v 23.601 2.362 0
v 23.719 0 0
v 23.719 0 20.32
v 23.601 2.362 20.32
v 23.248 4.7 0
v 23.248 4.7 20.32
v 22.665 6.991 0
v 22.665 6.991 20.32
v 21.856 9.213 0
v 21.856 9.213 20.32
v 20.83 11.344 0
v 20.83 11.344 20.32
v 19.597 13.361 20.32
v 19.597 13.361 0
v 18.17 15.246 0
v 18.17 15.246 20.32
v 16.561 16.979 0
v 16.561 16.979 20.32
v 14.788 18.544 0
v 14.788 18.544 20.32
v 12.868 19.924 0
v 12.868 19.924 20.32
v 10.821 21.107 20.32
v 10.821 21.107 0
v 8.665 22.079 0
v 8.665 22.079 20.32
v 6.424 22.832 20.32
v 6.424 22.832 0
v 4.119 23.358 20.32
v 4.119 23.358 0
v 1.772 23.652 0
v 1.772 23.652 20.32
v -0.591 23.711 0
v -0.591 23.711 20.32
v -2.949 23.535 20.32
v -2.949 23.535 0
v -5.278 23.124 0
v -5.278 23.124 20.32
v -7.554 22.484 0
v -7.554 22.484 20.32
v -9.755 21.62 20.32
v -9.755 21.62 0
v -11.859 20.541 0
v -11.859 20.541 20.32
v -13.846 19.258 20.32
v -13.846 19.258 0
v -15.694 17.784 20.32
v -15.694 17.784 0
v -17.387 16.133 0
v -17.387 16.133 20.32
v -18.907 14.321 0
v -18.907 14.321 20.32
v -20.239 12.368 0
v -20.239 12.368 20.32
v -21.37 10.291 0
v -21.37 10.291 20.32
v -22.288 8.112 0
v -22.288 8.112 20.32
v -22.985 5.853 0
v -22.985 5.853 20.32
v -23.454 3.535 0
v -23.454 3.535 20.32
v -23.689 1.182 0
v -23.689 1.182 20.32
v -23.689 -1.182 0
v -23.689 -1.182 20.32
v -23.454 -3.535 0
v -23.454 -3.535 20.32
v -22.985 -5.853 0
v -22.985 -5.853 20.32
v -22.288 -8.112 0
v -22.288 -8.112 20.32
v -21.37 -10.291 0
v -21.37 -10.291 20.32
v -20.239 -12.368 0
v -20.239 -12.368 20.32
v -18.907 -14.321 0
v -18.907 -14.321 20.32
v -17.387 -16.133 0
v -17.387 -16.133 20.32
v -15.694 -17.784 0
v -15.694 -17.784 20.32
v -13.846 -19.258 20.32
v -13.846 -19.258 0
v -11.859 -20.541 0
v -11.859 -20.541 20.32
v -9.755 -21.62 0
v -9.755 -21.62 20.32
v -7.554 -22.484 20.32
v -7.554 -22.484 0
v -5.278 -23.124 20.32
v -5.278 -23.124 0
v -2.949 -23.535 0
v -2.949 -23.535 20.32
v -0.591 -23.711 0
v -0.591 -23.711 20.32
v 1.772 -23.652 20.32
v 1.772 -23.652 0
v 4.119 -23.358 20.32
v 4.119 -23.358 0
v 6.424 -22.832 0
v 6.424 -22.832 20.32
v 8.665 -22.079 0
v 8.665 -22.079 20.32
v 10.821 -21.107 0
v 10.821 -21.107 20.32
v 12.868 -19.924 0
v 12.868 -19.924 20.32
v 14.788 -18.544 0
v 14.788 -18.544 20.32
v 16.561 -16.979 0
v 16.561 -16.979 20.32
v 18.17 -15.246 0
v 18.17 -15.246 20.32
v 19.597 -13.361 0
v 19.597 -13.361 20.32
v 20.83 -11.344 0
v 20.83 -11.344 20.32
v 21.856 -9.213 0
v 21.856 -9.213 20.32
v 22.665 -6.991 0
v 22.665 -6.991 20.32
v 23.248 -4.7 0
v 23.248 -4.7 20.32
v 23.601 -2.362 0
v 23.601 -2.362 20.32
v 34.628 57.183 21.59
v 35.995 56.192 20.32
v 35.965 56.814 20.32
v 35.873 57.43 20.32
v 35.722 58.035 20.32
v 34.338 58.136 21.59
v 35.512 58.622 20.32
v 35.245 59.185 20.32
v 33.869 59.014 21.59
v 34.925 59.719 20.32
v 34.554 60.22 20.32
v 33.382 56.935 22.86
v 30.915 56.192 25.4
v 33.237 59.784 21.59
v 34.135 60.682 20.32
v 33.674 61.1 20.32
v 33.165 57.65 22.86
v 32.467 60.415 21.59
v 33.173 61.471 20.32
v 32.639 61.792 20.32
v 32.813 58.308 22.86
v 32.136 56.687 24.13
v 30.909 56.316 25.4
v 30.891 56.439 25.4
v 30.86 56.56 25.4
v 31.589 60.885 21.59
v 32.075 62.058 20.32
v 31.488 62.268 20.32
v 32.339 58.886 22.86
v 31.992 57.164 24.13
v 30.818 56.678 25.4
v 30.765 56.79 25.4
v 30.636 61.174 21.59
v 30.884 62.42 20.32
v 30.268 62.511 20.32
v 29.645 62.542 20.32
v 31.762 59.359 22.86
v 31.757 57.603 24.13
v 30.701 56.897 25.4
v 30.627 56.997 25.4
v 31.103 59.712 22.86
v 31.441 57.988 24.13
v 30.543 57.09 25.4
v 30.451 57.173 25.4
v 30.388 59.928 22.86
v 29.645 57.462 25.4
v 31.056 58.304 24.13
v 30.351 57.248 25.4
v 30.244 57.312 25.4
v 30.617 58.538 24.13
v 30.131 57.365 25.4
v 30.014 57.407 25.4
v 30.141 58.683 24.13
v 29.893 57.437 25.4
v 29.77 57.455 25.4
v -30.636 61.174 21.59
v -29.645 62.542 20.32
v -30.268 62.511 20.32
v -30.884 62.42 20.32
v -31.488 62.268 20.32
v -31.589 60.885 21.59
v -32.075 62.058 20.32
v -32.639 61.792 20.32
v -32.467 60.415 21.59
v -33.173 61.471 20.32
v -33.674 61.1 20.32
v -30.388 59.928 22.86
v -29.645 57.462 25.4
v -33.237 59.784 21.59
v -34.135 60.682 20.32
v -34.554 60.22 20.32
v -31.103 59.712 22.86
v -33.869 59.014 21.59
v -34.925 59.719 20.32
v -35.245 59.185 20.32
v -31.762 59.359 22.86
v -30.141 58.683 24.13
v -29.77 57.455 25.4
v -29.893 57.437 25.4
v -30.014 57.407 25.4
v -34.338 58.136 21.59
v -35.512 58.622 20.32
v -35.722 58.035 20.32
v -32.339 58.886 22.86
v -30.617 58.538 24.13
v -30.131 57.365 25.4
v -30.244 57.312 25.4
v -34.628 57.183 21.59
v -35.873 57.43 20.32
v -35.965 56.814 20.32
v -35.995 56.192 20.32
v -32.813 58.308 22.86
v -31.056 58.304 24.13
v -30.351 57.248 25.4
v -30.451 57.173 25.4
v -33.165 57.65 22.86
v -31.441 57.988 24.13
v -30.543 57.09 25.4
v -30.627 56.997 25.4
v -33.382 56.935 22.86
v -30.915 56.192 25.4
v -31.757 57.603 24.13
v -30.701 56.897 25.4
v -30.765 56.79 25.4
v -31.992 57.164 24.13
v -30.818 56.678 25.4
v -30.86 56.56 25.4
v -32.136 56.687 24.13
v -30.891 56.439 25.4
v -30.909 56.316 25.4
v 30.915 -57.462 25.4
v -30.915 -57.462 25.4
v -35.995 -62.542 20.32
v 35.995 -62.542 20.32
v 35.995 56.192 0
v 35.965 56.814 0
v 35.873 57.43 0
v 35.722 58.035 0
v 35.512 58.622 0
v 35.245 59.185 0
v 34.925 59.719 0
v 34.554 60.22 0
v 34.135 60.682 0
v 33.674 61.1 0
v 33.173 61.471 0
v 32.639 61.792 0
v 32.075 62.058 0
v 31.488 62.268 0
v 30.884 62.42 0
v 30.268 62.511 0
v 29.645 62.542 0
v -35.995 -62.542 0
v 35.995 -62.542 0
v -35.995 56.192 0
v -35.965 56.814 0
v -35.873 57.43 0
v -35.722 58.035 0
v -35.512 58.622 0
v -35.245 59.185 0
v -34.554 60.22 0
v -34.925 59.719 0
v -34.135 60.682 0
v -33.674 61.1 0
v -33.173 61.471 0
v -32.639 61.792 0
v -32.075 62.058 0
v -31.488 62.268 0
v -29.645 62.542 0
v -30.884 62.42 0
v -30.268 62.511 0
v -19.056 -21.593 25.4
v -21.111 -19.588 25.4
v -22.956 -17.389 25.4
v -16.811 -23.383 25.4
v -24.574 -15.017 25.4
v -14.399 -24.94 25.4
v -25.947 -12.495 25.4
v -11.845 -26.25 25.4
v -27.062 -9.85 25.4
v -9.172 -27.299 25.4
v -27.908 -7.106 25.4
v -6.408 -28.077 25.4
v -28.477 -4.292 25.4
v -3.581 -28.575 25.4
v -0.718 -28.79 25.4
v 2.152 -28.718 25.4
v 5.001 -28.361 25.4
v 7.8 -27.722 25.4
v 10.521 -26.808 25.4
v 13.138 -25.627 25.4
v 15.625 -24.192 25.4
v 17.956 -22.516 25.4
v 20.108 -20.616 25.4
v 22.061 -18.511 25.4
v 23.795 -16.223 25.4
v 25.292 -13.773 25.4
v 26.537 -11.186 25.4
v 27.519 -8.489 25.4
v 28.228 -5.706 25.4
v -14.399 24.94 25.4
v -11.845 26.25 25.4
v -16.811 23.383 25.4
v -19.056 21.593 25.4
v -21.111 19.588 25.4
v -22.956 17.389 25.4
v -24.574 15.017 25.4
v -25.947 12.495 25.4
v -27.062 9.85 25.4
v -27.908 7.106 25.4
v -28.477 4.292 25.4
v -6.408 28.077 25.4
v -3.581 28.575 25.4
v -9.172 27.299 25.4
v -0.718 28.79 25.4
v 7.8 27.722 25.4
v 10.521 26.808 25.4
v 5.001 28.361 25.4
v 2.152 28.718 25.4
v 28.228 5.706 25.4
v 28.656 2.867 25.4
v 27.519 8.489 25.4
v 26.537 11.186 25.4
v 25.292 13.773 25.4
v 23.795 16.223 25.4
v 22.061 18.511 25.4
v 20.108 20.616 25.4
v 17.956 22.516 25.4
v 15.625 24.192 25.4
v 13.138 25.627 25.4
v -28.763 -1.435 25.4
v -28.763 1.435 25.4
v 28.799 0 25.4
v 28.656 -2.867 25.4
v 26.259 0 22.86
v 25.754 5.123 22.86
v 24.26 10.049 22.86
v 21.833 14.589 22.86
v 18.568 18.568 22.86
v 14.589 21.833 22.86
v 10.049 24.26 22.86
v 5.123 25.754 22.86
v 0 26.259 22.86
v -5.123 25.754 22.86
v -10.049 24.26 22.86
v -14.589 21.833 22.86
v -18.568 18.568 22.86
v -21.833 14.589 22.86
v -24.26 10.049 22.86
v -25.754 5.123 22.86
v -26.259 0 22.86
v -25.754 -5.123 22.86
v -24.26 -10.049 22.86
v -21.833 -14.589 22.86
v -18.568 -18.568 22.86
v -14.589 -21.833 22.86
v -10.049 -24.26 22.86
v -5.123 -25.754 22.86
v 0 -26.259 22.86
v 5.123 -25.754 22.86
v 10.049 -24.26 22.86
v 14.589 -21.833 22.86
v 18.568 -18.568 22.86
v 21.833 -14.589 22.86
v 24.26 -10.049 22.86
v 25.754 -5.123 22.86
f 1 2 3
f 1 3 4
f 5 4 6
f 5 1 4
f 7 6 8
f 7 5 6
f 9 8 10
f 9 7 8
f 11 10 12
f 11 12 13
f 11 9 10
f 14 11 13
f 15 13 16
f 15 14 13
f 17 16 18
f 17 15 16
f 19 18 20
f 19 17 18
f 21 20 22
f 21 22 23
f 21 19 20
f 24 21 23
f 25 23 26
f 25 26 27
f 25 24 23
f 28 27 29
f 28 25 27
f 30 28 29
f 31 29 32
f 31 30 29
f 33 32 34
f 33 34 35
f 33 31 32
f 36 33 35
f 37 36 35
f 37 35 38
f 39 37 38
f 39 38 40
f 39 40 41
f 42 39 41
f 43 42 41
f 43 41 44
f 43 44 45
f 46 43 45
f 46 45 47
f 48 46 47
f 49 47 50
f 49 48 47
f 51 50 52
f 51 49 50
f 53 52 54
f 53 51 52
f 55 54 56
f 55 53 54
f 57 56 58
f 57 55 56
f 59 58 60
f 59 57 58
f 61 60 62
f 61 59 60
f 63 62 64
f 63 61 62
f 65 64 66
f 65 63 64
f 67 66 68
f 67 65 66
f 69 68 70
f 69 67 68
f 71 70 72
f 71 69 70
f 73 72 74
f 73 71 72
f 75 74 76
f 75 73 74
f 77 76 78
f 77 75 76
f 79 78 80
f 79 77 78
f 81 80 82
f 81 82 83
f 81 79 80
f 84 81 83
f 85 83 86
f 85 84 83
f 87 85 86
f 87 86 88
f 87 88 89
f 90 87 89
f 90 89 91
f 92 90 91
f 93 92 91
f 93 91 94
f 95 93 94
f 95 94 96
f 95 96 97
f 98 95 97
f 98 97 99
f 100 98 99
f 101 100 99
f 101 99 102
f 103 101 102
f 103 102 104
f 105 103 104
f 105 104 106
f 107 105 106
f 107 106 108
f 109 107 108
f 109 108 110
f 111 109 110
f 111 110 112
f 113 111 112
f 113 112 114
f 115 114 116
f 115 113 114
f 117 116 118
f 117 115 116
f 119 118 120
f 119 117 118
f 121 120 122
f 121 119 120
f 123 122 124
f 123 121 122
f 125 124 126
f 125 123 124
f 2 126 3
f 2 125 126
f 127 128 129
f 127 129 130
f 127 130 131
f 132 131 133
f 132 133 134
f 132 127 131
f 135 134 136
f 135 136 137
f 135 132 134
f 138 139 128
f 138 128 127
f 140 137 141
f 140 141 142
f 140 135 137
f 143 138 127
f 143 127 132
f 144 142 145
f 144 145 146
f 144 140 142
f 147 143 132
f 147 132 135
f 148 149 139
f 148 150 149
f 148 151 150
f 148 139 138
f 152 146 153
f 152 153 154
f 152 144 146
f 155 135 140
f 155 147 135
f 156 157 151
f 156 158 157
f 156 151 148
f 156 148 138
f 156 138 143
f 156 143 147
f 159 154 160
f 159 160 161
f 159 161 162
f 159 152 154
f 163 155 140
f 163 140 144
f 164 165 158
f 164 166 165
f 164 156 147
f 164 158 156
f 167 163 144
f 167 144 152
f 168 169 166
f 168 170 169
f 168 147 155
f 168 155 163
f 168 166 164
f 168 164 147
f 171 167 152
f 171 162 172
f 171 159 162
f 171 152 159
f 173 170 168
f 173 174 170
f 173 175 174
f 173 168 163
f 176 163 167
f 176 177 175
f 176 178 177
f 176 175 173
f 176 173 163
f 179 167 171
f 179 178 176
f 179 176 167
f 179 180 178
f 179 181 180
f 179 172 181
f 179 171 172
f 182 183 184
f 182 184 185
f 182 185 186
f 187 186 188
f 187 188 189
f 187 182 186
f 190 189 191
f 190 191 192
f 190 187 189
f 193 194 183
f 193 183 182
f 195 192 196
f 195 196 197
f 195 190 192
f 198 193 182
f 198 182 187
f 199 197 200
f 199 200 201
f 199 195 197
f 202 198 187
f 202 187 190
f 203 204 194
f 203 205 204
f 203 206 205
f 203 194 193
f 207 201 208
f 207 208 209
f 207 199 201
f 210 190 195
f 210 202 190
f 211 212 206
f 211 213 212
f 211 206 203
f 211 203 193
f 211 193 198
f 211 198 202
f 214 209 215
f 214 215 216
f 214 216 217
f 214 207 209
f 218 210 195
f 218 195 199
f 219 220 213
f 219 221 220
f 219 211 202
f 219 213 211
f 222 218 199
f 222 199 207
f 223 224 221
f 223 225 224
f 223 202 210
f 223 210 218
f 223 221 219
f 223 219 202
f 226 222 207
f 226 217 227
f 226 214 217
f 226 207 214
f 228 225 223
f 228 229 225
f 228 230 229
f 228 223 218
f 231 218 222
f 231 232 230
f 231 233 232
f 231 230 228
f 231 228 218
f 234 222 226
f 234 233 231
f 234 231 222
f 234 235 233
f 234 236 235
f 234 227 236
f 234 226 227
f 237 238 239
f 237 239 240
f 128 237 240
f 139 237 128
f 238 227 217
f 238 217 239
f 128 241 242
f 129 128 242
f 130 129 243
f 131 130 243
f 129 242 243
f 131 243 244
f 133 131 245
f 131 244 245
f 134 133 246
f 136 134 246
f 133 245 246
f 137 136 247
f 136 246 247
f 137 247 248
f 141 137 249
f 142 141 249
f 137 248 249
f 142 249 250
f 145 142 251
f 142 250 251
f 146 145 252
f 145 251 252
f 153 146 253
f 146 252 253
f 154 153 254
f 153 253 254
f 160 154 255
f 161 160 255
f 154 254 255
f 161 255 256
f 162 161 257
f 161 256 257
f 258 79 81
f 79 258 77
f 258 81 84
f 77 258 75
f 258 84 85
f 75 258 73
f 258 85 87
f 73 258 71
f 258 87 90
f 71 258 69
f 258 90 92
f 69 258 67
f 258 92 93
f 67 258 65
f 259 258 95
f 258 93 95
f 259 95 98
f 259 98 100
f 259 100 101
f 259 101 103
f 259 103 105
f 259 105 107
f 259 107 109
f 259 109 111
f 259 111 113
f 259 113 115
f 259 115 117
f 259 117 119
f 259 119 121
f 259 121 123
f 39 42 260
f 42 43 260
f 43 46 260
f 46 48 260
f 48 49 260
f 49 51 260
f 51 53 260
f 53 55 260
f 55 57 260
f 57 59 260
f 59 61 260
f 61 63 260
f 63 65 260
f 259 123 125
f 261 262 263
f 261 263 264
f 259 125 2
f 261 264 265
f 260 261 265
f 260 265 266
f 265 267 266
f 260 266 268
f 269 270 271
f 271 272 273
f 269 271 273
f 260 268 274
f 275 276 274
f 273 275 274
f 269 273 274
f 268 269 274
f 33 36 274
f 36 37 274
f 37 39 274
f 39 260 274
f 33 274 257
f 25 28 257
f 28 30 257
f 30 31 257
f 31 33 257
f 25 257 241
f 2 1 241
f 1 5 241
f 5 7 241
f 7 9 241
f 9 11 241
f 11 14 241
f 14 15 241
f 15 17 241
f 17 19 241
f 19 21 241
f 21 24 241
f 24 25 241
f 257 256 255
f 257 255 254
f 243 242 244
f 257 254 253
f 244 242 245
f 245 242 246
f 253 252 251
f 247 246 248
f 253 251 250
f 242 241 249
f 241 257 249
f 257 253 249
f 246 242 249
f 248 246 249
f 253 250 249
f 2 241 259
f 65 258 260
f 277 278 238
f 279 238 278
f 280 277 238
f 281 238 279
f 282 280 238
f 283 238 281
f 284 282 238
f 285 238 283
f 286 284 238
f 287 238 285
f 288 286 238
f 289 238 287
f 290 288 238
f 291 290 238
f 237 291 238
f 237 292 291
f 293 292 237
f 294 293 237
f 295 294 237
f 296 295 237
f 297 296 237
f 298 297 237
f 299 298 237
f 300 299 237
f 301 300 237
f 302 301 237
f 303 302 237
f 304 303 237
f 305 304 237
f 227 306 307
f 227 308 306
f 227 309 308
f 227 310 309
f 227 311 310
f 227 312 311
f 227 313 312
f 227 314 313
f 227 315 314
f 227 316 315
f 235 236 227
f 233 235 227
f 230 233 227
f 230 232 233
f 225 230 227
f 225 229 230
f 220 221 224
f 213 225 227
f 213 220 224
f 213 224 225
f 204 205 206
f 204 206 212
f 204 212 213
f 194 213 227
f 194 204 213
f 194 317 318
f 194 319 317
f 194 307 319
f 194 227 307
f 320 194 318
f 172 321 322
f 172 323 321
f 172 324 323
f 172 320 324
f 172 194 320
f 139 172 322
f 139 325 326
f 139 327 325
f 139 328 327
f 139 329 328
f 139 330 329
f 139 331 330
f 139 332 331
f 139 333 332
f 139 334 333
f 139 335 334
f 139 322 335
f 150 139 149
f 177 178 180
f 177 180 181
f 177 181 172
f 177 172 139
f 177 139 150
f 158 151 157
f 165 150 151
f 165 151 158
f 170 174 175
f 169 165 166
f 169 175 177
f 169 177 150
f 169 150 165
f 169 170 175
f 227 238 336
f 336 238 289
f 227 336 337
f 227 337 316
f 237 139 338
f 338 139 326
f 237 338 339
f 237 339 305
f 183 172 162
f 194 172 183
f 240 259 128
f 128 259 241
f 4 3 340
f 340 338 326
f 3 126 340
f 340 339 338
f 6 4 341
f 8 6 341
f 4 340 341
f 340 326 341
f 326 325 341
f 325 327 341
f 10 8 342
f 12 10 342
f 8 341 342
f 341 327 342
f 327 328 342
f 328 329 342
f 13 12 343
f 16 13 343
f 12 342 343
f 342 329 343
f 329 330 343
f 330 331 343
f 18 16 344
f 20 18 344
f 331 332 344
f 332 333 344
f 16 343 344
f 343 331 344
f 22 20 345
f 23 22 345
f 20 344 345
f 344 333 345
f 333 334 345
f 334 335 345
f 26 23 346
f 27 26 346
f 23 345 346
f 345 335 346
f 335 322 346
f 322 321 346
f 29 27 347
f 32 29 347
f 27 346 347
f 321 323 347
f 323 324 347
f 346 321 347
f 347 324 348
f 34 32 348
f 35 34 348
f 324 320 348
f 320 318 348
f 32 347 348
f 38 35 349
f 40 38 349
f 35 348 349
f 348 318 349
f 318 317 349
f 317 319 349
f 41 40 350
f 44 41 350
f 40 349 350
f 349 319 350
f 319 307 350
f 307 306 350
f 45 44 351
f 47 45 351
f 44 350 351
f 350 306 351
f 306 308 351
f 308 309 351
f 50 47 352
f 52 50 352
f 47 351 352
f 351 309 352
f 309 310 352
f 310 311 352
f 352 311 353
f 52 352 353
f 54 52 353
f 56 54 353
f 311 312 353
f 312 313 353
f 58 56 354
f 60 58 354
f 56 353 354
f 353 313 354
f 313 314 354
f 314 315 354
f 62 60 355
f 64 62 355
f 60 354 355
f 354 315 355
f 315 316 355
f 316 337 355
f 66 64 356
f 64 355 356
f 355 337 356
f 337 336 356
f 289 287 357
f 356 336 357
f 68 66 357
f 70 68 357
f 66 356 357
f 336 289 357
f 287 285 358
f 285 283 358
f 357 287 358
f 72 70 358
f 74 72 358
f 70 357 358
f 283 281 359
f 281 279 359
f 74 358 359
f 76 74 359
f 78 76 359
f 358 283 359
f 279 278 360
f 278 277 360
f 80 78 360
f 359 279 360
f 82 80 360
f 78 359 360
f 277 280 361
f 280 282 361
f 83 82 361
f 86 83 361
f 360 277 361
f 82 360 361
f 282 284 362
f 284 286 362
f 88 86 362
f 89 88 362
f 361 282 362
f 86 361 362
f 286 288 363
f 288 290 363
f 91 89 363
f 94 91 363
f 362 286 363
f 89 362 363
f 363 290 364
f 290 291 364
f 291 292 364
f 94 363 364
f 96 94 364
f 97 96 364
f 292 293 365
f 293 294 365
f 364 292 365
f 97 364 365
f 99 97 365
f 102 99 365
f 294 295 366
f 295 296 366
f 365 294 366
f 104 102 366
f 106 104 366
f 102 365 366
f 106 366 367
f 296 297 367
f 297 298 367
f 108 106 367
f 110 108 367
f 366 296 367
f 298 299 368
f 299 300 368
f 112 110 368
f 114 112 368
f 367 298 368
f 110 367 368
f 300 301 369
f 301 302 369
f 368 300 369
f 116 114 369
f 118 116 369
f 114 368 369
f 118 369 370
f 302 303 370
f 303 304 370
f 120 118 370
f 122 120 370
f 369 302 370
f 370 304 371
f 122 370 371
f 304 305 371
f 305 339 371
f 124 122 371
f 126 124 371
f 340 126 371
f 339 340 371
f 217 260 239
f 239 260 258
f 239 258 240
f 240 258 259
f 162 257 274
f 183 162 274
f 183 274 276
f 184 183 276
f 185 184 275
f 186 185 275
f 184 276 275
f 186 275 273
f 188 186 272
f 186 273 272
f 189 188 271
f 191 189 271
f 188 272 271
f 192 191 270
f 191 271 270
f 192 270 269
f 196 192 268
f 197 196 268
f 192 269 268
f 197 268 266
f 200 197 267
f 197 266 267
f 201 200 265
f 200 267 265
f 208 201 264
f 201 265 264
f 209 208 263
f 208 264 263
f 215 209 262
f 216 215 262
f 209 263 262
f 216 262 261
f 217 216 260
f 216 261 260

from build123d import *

# Parameters (mm, degrees)
F0_R     = 23.71864
F1_DEPTH = 25.4
F2_SIZE2 = 5.08
F2_SIZE  = 5.08


with BuildPart() as f1:
    # F0 (on Top) → F1 (new body)
    with BuildSketch(Plane.XY):
        with BuildLine():
            Line((-35.99517, -62.541589), (35.99517, -62.541589))
            Line((35.99517, -62.541589), (35.99517, 56.191589))
            ThreePointArc((35.99517, 56.191589), (34.135299, 60.681717), (29.64517, 62.541589))
            Line((29.64517, 62.541589), (-29.64517, 62.541589))
            ThreePointArc((-29.64517, 62.541589), (-34.135299, 60.681717), (-35.99517, 56.191589))
            Line((-35.99517, 56.191589), (-35.99517, -62.541589))
        make_face()
        Circle(F0_R, mode=Mode.SUBTRACT)
    extrude(amount=F1_DEPTH)

    # F2
    f2_edges = [f1.edges().sort_by_distance(p)[0] for p in [
        (-35.99517, -3.175, 25.4),
        (0, -62.541589, 25.4),
        (35.99517, -3.175, 25.4),
        (34.135299, 60.681717, 25.4),
        (0, 62.541589, 25.4),
        (-34.135299, 60.681717, 25.4),
        (-23.71864, 0, 25.4),
    ]]
    chamfer(f2_edges, length=F2_SIZE, length2=F2_SIZE2)


solid = f1.part
